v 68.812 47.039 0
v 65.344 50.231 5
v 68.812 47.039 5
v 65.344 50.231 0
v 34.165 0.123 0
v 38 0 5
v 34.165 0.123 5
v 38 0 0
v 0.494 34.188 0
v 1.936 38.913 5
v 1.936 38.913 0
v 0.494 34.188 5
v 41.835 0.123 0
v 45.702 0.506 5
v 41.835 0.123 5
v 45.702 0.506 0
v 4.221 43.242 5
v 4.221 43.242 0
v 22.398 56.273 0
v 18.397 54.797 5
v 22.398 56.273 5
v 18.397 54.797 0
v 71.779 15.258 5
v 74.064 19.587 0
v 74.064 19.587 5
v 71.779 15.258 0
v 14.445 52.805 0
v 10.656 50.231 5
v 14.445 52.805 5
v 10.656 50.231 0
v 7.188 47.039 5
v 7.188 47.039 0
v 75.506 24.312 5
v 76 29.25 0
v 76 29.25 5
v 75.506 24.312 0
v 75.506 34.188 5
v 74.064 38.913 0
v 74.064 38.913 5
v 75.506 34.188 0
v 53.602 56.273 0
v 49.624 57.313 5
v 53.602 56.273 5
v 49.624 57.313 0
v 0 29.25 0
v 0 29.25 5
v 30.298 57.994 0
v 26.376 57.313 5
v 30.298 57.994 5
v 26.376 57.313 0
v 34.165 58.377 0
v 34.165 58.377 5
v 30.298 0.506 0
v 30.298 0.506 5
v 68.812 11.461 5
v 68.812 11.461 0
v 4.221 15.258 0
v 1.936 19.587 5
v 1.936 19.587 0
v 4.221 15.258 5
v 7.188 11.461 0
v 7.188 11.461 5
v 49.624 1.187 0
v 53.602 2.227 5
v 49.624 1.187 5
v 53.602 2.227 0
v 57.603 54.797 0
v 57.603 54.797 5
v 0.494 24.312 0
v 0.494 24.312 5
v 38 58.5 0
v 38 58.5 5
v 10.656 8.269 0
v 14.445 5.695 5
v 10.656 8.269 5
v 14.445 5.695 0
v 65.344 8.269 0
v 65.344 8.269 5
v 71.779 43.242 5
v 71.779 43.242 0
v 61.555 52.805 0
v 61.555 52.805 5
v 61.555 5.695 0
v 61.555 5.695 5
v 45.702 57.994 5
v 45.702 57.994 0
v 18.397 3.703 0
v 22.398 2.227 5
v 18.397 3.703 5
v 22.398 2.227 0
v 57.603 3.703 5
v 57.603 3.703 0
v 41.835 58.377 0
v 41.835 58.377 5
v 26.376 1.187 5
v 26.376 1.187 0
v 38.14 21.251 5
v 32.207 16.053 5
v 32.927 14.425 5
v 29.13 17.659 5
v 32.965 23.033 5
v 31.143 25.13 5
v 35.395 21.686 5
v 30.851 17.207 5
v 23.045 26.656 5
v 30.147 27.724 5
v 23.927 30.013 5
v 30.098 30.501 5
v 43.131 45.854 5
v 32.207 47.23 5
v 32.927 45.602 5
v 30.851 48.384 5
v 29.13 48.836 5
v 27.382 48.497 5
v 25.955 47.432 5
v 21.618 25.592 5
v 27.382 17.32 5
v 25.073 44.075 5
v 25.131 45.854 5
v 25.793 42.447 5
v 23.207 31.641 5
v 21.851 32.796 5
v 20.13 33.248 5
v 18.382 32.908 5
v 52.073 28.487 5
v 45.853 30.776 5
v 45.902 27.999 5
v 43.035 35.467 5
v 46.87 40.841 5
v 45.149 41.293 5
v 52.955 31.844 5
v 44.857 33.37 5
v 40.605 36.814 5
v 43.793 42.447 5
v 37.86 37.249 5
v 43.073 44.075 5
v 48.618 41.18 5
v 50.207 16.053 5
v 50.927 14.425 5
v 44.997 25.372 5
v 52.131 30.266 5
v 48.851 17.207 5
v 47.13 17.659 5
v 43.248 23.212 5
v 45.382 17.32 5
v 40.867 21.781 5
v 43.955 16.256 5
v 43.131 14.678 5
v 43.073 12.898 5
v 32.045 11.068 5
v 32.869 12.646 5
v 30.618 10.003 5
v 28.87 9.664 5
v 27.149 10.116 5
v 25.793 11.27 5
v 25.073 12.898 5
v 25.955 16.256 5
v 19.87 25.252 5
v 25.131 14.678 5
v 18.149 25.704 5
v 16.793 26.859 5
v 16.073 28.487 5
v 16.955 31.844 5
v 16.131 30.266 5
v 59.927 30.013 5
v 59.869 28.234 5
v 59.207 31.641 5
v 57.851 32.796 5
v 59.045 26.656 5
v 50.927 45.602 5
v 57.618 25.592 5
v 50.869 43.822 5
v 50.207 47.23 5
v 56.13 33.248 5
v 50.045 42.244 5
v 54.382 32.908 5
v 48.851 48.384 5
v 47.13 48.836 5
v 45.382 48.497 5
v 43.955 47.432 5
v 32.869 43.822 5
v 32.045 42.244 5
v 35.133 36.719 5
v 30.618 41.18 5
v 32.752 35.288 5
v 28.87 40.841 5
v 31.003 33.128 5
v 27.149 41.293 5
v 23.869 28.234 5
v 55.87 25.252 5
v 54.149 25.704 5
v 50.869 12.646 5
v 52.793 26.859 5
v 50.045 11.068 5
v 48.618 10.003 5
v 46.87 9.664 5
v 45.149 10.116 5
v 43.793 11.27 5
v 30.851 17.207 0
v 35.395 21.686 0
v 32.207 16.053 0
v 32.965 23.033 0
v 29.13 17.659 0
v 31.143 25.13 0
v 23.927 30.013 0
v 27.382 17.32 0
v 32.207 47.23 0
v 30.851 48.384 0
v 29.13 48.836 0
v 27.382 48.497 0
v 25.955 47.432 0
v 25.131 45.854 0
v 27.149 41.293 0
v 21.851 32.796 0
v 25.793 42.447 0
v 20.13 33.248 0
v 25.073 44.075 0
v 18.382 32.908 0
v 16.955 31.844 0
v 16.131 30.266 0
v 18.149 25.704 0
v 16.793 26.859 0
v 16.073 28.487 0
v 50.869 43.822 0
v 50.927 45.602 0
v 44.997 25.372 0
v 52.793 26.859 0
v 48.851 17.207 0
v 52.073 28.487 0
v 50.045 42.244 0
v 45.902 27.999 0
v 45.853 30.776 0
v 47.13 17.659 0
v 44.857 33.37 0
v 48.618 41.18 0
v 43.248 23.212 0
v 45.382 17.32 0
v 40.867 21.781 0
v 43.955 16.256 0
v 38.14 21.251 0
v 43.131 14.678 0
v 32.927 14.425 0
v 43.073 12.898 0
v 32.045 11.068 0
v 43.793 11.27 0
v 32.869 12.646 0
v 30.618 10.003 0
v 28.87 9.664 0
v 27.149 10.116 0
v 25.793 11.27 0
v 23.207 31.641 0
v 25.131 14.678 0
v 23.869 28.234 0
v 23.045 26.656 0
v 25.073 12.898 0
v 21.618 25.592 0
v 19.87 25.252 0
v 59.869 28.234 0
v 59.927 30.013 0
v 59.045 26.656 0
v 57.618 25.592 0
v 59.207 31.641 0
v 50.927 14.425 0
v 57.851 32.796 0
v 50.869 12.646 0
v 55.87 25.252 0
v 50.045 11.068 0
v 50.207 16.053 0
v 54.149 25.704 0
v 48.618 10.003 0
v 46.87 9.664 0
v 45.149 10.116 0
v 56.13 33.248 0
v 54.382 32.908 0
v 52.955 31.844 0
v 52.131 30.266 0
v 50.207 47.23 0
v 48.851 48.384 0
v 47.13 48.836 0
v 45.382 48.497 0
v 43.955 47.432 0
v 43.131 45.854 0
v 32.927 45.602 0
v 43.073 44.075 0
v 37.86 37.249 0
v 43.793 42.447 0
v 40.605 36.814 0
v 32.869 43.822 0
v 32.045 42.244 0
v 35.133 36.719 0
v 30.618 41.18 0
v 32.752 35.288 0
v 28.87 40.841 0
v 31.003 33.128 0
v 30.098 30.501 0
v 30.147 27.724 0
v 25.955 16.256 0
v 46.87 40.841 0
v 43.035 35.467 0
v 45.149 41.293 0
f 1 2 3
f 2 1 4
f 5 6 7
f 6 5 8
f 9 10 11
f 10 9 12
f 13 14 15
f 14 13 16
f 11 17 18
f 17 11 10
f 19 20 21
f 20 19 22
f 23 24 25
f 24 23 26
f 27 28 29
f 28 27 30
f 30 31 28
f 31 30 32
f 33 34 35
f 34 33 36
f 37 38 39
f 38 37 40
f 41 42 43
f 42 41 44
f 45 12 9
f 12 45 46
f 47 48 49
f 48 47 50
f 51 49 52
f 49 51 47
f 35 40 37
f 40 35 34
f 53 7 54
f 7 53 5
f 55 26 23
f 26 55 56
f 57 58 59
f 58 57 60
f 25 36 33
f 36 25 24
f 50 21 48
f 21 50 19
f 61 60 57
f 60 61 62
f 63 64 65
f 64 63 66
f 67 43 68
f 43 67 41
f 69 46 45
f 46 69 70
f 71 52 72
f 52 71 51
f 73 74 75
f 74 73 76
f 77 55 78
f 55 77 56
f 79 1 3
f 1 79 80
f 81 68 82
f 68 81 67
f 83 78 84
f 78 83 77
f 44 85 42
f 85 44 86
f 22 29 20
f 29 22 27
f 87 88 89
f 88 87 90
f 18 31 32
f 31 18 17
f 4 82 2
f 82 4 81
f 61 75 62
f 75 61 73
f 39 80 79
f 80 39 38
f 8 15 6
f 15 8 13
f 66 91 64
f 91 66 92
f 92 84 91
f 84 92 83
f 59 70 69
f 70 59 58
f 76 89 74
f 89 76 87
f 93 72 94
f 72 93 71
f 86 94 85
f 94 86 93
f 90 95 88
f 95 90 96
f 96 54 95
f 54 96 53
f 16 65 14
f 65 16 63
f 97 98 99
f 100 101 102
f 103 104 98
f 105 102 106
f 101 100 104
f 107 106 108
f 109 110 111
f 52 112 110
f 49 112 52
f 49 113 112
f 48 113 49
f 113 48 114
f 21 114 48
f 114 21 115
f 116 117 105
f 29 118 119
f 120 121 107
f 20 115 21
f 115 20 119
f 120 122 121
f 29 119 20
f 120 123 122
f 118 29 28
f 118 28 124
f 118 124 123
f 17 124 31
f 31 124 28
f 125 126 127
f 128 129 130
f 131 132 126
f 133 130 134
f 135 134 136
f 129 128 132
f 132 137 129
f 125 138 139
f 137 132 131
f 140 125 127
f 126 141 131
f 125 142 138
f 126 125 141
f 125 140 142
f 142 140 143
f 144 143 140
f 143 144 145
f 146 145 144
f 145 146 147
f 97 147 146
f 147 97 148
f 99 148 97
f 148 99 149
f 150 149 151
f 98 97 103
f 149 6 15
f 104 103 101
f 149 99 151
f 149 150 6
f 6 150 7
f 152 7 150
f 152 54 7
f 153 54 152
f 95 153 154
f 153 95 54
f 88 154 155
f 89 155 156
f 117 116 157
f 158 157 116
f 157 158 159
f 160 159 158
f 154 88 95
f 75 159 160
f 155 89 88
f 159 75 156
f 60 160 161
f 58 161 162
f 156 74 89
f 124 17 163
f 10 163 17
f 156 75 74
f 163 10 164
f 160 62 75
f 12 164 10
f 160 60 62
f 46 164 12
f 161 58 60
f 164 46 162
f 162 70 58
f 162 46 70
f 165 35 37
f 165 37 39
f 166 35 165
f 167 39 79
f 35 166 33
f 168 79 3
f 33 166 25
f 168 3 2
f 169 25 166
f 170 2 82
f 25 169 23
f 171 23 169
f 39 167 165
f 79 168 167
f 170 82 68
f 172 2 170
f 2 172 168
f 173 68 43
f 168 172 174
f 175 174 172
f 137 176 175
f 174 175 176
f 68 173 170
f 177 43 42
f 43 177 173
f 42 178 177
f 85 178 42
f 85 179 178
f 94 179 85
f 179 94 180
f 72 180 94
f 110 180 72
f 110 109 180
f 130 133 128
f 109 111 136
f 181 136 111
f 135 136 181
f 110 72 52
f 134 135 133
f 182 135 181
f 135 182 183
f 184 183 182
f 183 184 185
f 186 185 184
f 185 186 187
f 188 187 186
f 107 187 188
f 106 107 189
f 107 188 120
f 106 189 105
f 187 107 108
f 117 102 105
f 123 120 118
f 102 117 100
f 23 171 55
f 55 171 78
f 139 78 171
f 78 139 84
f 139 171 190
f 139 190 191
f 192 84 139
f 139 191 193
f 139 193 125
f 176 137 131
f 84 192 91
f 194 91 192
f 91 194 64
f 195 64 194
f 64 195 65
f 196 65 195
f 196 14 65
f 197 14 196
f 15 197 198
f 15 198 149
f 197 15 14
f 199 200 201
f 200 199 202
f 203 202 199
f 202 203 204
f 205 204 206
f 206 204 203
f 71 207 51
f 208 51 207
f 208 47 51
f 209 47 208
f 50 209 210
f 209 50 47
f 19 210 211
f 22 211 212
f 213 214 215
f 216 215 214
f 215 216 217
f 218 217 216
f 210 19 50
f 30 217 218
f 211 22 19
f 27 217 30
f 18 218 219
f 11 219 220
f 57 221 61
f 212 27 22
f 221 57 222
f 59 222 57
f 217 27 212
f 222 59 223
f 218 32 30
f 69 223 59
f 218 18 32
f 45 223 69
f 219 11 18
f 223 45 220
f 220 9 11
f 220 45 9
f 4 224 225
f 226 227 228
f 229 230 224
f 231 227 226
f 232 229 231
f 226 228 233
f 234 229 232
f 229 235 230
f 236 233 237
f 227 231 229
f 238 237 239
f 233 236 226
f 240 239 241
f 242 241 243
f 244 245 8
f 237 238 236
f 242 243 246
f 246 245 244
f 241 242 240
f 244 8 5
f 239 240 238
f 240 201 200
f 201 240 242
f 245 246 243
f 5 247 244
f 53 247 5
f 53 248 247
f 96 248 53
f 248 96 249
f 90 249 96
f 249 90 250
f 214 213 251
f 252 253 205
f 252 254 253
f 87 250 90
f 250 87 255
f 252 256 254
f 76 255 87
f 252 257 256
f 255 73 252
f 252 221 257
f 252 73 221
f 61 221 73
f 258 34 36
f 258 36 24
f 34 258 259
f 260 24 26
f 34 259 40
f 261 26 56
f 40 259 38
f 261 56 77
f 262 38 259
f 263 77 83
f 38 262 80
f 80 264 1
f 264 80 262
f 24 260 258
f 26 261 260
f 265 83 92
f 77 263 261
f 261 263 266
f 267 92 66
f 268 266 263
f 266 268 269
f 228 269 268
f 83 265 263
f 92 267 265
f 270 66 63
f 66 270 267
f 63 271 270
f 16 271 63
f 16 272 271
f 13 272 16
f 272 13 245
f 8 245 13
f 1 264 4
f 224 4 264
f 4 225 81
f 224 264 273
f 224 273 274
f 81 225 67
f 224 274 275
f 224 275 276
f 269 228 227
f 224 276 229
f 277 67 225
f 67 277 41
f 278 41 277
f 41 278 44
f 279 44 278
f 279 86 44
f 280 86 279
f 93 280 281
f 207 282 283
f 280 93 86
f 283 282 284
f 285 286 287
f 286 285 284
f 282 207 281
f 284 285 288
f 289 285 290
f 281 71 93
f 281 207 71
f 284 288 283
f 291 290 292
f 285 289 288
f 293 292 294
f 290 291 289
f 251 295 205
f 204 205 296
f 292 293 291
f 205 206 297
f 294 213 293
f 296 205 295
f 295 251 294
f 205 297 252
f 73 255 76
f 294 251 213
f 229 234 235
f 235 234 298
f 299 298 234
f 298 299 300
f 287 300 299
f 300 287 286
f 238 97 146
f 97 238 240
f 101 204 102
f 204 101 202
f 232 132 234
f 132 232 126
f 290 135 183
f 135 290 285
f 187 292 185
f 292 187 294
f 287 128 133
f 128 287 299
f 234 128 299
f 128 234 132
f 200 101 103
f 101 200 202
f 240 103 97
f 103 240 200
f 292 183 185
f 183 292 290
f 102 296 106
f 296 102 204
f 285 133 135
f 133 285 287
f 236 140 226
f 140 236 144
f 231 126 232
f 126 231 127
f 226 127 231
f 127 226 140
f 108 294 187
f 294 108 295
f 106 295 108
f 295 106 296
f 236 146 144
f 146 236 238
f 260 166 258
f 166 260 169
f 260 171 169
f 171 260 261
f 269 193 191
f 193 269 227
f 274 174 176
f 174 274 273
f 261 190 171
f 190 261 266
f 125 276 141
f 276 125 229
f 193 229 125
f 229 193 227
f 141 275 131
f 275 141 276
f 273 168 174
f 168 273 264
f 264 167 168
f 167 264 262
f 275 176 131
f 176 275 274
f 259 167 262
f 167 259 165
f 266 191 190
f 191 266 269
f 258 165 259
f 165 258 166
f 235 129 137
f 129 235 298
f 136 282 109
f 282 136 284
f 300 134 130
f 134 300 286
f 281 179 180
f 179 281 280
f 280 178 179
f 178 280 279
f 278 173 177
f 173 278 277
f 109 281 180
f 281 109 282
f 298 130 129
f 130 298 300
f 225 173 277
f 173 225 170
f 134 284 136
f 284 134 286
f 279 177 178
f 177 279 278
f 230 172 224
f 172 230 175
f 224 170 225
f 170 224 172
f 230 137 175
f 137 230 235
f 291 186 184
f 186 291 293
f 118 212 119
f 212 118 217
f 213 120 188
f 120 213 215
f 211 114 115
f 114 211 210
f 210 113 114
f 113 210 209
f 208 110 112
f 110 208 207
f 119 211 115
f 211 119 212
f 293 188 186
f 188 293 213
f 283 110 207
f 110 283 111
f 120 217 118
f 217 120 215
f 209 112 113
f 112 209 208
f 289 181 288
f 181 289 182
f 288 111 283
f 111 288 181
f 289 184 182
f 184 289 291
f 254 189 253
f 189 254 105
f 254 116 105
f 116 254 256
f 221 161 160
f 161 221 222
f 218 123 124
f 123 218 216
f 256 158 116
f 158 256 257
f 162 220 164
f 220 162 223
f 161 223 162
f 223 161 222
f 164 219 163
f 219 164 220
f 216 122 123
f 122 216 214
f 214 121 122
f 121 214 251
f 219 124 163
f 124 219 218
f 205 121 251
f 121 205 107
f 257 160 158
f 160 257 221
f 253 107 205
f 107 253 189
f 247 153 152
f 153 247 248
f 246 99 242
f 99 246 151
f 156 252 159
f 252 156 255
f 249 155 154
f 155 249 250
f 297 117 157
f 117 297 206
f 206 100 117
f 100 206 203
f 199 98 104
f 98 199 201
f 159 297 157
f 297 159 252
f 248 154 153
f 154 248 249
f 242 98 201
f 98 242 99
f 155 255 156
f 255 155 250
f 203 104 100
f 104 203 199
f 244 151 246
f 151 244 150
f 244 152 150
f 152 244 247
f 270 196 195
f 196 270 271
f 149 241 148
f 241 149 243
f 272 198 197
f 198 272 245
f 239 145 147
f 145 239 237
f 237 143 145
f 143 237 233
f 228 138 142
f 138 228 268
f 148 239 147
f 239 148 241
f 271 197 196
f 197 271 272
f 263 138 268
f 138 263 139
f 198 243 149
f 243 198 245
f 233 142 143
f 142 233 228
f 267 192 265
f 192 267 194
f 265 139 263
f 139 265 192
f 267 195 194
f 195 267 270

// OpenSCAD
$fn = 32;

// ----------------------------------------------------------------------
// Cam plate: double_lobe cam, base R28
// ----------------------------------------------------------------------

// --- parameters (mm) ---
base_r = 28;              // base circle radius
lobe_h = 10;              // cam lobe rise
bore_r = 8;               // shaft bore radius
plate_t = 5;              // plate thickness, Z (extrusion height)
ring_r = 18;              // lightening ring radius
bolt_r = 4;               // lightening hole radius

profile = [[76, 29.25], [75.506, 34.188], [74.064, 38.913], [71.779, 43.242], [68.812, 47.039], [65.344, 50.231], [61.555, 52.805], [57.603, 54.797], [53.602, 56.273], [49.624, 57.313], [45.702, 57.994], [41.835, 58.377], [38, 58.5], [34.165, 58.377], [30.298, 57.994], [26.376, 57.313], [22.398, 56.273], [18.397, 54.797], [14.445, 52.805], [10.656, 50.231], [7.188, 47.039], [4.221, 43.242], [1.936, 38.913], [0.494, 34.188], [0, 29.25], [0.494, 24.312], [1.936, 19.587], [4.221, 15.258], [7.188, 11.461], [10.656, 8.269], [14.445, 5.695], [18.397, 3.703], [22.398, 2.227], [26.376, 1.187], [30.298, 0.506], [34.165, 0.123], [38, 0], [41.835, 0.123], [45.702, 0.506], [49.624, 1.187], [53.602, 2.227], [57.603, 3.703], [61.555, 5.695], [65.344, 8.269], [68.812, 11.461], [71.779, 15.258], [74.064, 19.587], [75.506, 24.312]];  // primary outline, 48 points, counter clockwise
void_1 = [[45.853, 30.776], [44.857, 33.37], [43.035, 35.467], [40.605, 36.814], [37.86, 37.249], [35.133, 36.719], [32.752, 35.288], [31.003, 33.128], [30.098, 30.501], [30.147, 27.724], [31.143, 25.13], [32.965, 23.033], [35.395, 21.686], [38.14, 21.251], [40.867, 21.781], [43.248, 23.212], [44.997, 25.372], [45.902, 27.999]];  // shaft bore, 18 points
void_2 = [[59.927, 30.013], [59.207, 31.641], [57.851, 32.796], [56.13, 33.248], [54.382, 32.908], [52.955, 31.844], [52.131, 30.266], [52.073, 28.487], [52.793, 26.859], [54.149, 25.704], [55.87, 25.252], [57.618, 25.592], [59.045, 26.656], [59.869, 28.234]];  // lightening hole 1, 14 points
void_3 = [[50.927, 45.602], [50.207, 47.23], [48.851, 48.384], [47.13, 48.836], [45.382, 48.497], [43.955, 47.432], [43.131, 45.854], [43.073, 44.075], [43.793, 42.447], [45.149, 41.293], [46.87, 40.841], [48.618, 41.18], [50.045, 42.244], [50.869, 43.822]];  // lightening hole 2, 14 points
void_4 = [[32.927, 45.602], [32.207, 47.23], [30.851, 48.384], [29.13, 48.836], [27.382, 48.497], [25.955, 47.432], [25.131, 45.854], [25.073, 44.075], [25.793, 42.447], [27.149, 41.293], [28.87, 40.841], [30.618, 41.18], [32.045, 42.244], [32.869, 43.822]];  // lightening hole 3, 14 points
void_5 = [[23.927, 30.013], [23.207, 31.641], [21.851, 32.796], [20.13, 33.248], [18.382, 32.908], [16.955, 31.844], [16.131, 30.266], [16.073, 28.487], [16.793, 26.859], [18.149, 25.704], [19.87, 25.252], [21.618, 25.592], [23.045, 26.656], [23.869, 28.234]];  // lightening hole 4, 14 points
void_6 = [[32.927, 14.425], [32.207, 16.053], [30.851, 17.207], [29.13, 17.659], [27.382, 17.32], [25.955, 16.256], [25.131, 14.678], [25.073, 12.898], [25.793, 11.27], [27.149, 10.116], [28.87, 9.664], [30.618, 10.003], [32.045, 11.068], [32.869, 12.646]];  // lightening hole 5, 14 points
void_7 = [[50.927, 14.425], [50.207, 16.053], [48.851, 17.207], [47.13, 17.659], [45.382, 17.32], [43.955, 16.256], [43.131, 14.678], [43.073, 12.898], [43.793, 11.27], [45.149, 10.116], [46.87, 9.664], [48.618, 10.003], [50.045, 11.068], [50.869, 12.646]];  // lightening hole 6, 14 points

// --- the one profile operation ---
difference() {
  linear_extrude(height = plate_t) polygon(points = profile);
  translate([0, 0, -1])
    linear_extrude(height = plate_t + 2) polygon(points = void_1);
  translate([0, 0, -1])
    linear_extrude(height = plate_t + 2) polygon(points = void_2);
  translate([0, 0, -1])
    linear_extrude(height = plate_t + 2) polygon(points = void_3);
  translate([0, 0, -1])
    linear_extrude(height = plate_t + 2) polygon(points = void_4);
  translate([0, 0, -1])
    linear_extrude(height = plate_t + 2) polygon(points = void_5);
  translate([0, 0, -1])
    linear_extrude(height = plate_t + 2) polygon(points = void_6);
  translate([0, 0, -1])
    linear_extrude(height = plate_t + 2) polygon(points = void_7);
}
